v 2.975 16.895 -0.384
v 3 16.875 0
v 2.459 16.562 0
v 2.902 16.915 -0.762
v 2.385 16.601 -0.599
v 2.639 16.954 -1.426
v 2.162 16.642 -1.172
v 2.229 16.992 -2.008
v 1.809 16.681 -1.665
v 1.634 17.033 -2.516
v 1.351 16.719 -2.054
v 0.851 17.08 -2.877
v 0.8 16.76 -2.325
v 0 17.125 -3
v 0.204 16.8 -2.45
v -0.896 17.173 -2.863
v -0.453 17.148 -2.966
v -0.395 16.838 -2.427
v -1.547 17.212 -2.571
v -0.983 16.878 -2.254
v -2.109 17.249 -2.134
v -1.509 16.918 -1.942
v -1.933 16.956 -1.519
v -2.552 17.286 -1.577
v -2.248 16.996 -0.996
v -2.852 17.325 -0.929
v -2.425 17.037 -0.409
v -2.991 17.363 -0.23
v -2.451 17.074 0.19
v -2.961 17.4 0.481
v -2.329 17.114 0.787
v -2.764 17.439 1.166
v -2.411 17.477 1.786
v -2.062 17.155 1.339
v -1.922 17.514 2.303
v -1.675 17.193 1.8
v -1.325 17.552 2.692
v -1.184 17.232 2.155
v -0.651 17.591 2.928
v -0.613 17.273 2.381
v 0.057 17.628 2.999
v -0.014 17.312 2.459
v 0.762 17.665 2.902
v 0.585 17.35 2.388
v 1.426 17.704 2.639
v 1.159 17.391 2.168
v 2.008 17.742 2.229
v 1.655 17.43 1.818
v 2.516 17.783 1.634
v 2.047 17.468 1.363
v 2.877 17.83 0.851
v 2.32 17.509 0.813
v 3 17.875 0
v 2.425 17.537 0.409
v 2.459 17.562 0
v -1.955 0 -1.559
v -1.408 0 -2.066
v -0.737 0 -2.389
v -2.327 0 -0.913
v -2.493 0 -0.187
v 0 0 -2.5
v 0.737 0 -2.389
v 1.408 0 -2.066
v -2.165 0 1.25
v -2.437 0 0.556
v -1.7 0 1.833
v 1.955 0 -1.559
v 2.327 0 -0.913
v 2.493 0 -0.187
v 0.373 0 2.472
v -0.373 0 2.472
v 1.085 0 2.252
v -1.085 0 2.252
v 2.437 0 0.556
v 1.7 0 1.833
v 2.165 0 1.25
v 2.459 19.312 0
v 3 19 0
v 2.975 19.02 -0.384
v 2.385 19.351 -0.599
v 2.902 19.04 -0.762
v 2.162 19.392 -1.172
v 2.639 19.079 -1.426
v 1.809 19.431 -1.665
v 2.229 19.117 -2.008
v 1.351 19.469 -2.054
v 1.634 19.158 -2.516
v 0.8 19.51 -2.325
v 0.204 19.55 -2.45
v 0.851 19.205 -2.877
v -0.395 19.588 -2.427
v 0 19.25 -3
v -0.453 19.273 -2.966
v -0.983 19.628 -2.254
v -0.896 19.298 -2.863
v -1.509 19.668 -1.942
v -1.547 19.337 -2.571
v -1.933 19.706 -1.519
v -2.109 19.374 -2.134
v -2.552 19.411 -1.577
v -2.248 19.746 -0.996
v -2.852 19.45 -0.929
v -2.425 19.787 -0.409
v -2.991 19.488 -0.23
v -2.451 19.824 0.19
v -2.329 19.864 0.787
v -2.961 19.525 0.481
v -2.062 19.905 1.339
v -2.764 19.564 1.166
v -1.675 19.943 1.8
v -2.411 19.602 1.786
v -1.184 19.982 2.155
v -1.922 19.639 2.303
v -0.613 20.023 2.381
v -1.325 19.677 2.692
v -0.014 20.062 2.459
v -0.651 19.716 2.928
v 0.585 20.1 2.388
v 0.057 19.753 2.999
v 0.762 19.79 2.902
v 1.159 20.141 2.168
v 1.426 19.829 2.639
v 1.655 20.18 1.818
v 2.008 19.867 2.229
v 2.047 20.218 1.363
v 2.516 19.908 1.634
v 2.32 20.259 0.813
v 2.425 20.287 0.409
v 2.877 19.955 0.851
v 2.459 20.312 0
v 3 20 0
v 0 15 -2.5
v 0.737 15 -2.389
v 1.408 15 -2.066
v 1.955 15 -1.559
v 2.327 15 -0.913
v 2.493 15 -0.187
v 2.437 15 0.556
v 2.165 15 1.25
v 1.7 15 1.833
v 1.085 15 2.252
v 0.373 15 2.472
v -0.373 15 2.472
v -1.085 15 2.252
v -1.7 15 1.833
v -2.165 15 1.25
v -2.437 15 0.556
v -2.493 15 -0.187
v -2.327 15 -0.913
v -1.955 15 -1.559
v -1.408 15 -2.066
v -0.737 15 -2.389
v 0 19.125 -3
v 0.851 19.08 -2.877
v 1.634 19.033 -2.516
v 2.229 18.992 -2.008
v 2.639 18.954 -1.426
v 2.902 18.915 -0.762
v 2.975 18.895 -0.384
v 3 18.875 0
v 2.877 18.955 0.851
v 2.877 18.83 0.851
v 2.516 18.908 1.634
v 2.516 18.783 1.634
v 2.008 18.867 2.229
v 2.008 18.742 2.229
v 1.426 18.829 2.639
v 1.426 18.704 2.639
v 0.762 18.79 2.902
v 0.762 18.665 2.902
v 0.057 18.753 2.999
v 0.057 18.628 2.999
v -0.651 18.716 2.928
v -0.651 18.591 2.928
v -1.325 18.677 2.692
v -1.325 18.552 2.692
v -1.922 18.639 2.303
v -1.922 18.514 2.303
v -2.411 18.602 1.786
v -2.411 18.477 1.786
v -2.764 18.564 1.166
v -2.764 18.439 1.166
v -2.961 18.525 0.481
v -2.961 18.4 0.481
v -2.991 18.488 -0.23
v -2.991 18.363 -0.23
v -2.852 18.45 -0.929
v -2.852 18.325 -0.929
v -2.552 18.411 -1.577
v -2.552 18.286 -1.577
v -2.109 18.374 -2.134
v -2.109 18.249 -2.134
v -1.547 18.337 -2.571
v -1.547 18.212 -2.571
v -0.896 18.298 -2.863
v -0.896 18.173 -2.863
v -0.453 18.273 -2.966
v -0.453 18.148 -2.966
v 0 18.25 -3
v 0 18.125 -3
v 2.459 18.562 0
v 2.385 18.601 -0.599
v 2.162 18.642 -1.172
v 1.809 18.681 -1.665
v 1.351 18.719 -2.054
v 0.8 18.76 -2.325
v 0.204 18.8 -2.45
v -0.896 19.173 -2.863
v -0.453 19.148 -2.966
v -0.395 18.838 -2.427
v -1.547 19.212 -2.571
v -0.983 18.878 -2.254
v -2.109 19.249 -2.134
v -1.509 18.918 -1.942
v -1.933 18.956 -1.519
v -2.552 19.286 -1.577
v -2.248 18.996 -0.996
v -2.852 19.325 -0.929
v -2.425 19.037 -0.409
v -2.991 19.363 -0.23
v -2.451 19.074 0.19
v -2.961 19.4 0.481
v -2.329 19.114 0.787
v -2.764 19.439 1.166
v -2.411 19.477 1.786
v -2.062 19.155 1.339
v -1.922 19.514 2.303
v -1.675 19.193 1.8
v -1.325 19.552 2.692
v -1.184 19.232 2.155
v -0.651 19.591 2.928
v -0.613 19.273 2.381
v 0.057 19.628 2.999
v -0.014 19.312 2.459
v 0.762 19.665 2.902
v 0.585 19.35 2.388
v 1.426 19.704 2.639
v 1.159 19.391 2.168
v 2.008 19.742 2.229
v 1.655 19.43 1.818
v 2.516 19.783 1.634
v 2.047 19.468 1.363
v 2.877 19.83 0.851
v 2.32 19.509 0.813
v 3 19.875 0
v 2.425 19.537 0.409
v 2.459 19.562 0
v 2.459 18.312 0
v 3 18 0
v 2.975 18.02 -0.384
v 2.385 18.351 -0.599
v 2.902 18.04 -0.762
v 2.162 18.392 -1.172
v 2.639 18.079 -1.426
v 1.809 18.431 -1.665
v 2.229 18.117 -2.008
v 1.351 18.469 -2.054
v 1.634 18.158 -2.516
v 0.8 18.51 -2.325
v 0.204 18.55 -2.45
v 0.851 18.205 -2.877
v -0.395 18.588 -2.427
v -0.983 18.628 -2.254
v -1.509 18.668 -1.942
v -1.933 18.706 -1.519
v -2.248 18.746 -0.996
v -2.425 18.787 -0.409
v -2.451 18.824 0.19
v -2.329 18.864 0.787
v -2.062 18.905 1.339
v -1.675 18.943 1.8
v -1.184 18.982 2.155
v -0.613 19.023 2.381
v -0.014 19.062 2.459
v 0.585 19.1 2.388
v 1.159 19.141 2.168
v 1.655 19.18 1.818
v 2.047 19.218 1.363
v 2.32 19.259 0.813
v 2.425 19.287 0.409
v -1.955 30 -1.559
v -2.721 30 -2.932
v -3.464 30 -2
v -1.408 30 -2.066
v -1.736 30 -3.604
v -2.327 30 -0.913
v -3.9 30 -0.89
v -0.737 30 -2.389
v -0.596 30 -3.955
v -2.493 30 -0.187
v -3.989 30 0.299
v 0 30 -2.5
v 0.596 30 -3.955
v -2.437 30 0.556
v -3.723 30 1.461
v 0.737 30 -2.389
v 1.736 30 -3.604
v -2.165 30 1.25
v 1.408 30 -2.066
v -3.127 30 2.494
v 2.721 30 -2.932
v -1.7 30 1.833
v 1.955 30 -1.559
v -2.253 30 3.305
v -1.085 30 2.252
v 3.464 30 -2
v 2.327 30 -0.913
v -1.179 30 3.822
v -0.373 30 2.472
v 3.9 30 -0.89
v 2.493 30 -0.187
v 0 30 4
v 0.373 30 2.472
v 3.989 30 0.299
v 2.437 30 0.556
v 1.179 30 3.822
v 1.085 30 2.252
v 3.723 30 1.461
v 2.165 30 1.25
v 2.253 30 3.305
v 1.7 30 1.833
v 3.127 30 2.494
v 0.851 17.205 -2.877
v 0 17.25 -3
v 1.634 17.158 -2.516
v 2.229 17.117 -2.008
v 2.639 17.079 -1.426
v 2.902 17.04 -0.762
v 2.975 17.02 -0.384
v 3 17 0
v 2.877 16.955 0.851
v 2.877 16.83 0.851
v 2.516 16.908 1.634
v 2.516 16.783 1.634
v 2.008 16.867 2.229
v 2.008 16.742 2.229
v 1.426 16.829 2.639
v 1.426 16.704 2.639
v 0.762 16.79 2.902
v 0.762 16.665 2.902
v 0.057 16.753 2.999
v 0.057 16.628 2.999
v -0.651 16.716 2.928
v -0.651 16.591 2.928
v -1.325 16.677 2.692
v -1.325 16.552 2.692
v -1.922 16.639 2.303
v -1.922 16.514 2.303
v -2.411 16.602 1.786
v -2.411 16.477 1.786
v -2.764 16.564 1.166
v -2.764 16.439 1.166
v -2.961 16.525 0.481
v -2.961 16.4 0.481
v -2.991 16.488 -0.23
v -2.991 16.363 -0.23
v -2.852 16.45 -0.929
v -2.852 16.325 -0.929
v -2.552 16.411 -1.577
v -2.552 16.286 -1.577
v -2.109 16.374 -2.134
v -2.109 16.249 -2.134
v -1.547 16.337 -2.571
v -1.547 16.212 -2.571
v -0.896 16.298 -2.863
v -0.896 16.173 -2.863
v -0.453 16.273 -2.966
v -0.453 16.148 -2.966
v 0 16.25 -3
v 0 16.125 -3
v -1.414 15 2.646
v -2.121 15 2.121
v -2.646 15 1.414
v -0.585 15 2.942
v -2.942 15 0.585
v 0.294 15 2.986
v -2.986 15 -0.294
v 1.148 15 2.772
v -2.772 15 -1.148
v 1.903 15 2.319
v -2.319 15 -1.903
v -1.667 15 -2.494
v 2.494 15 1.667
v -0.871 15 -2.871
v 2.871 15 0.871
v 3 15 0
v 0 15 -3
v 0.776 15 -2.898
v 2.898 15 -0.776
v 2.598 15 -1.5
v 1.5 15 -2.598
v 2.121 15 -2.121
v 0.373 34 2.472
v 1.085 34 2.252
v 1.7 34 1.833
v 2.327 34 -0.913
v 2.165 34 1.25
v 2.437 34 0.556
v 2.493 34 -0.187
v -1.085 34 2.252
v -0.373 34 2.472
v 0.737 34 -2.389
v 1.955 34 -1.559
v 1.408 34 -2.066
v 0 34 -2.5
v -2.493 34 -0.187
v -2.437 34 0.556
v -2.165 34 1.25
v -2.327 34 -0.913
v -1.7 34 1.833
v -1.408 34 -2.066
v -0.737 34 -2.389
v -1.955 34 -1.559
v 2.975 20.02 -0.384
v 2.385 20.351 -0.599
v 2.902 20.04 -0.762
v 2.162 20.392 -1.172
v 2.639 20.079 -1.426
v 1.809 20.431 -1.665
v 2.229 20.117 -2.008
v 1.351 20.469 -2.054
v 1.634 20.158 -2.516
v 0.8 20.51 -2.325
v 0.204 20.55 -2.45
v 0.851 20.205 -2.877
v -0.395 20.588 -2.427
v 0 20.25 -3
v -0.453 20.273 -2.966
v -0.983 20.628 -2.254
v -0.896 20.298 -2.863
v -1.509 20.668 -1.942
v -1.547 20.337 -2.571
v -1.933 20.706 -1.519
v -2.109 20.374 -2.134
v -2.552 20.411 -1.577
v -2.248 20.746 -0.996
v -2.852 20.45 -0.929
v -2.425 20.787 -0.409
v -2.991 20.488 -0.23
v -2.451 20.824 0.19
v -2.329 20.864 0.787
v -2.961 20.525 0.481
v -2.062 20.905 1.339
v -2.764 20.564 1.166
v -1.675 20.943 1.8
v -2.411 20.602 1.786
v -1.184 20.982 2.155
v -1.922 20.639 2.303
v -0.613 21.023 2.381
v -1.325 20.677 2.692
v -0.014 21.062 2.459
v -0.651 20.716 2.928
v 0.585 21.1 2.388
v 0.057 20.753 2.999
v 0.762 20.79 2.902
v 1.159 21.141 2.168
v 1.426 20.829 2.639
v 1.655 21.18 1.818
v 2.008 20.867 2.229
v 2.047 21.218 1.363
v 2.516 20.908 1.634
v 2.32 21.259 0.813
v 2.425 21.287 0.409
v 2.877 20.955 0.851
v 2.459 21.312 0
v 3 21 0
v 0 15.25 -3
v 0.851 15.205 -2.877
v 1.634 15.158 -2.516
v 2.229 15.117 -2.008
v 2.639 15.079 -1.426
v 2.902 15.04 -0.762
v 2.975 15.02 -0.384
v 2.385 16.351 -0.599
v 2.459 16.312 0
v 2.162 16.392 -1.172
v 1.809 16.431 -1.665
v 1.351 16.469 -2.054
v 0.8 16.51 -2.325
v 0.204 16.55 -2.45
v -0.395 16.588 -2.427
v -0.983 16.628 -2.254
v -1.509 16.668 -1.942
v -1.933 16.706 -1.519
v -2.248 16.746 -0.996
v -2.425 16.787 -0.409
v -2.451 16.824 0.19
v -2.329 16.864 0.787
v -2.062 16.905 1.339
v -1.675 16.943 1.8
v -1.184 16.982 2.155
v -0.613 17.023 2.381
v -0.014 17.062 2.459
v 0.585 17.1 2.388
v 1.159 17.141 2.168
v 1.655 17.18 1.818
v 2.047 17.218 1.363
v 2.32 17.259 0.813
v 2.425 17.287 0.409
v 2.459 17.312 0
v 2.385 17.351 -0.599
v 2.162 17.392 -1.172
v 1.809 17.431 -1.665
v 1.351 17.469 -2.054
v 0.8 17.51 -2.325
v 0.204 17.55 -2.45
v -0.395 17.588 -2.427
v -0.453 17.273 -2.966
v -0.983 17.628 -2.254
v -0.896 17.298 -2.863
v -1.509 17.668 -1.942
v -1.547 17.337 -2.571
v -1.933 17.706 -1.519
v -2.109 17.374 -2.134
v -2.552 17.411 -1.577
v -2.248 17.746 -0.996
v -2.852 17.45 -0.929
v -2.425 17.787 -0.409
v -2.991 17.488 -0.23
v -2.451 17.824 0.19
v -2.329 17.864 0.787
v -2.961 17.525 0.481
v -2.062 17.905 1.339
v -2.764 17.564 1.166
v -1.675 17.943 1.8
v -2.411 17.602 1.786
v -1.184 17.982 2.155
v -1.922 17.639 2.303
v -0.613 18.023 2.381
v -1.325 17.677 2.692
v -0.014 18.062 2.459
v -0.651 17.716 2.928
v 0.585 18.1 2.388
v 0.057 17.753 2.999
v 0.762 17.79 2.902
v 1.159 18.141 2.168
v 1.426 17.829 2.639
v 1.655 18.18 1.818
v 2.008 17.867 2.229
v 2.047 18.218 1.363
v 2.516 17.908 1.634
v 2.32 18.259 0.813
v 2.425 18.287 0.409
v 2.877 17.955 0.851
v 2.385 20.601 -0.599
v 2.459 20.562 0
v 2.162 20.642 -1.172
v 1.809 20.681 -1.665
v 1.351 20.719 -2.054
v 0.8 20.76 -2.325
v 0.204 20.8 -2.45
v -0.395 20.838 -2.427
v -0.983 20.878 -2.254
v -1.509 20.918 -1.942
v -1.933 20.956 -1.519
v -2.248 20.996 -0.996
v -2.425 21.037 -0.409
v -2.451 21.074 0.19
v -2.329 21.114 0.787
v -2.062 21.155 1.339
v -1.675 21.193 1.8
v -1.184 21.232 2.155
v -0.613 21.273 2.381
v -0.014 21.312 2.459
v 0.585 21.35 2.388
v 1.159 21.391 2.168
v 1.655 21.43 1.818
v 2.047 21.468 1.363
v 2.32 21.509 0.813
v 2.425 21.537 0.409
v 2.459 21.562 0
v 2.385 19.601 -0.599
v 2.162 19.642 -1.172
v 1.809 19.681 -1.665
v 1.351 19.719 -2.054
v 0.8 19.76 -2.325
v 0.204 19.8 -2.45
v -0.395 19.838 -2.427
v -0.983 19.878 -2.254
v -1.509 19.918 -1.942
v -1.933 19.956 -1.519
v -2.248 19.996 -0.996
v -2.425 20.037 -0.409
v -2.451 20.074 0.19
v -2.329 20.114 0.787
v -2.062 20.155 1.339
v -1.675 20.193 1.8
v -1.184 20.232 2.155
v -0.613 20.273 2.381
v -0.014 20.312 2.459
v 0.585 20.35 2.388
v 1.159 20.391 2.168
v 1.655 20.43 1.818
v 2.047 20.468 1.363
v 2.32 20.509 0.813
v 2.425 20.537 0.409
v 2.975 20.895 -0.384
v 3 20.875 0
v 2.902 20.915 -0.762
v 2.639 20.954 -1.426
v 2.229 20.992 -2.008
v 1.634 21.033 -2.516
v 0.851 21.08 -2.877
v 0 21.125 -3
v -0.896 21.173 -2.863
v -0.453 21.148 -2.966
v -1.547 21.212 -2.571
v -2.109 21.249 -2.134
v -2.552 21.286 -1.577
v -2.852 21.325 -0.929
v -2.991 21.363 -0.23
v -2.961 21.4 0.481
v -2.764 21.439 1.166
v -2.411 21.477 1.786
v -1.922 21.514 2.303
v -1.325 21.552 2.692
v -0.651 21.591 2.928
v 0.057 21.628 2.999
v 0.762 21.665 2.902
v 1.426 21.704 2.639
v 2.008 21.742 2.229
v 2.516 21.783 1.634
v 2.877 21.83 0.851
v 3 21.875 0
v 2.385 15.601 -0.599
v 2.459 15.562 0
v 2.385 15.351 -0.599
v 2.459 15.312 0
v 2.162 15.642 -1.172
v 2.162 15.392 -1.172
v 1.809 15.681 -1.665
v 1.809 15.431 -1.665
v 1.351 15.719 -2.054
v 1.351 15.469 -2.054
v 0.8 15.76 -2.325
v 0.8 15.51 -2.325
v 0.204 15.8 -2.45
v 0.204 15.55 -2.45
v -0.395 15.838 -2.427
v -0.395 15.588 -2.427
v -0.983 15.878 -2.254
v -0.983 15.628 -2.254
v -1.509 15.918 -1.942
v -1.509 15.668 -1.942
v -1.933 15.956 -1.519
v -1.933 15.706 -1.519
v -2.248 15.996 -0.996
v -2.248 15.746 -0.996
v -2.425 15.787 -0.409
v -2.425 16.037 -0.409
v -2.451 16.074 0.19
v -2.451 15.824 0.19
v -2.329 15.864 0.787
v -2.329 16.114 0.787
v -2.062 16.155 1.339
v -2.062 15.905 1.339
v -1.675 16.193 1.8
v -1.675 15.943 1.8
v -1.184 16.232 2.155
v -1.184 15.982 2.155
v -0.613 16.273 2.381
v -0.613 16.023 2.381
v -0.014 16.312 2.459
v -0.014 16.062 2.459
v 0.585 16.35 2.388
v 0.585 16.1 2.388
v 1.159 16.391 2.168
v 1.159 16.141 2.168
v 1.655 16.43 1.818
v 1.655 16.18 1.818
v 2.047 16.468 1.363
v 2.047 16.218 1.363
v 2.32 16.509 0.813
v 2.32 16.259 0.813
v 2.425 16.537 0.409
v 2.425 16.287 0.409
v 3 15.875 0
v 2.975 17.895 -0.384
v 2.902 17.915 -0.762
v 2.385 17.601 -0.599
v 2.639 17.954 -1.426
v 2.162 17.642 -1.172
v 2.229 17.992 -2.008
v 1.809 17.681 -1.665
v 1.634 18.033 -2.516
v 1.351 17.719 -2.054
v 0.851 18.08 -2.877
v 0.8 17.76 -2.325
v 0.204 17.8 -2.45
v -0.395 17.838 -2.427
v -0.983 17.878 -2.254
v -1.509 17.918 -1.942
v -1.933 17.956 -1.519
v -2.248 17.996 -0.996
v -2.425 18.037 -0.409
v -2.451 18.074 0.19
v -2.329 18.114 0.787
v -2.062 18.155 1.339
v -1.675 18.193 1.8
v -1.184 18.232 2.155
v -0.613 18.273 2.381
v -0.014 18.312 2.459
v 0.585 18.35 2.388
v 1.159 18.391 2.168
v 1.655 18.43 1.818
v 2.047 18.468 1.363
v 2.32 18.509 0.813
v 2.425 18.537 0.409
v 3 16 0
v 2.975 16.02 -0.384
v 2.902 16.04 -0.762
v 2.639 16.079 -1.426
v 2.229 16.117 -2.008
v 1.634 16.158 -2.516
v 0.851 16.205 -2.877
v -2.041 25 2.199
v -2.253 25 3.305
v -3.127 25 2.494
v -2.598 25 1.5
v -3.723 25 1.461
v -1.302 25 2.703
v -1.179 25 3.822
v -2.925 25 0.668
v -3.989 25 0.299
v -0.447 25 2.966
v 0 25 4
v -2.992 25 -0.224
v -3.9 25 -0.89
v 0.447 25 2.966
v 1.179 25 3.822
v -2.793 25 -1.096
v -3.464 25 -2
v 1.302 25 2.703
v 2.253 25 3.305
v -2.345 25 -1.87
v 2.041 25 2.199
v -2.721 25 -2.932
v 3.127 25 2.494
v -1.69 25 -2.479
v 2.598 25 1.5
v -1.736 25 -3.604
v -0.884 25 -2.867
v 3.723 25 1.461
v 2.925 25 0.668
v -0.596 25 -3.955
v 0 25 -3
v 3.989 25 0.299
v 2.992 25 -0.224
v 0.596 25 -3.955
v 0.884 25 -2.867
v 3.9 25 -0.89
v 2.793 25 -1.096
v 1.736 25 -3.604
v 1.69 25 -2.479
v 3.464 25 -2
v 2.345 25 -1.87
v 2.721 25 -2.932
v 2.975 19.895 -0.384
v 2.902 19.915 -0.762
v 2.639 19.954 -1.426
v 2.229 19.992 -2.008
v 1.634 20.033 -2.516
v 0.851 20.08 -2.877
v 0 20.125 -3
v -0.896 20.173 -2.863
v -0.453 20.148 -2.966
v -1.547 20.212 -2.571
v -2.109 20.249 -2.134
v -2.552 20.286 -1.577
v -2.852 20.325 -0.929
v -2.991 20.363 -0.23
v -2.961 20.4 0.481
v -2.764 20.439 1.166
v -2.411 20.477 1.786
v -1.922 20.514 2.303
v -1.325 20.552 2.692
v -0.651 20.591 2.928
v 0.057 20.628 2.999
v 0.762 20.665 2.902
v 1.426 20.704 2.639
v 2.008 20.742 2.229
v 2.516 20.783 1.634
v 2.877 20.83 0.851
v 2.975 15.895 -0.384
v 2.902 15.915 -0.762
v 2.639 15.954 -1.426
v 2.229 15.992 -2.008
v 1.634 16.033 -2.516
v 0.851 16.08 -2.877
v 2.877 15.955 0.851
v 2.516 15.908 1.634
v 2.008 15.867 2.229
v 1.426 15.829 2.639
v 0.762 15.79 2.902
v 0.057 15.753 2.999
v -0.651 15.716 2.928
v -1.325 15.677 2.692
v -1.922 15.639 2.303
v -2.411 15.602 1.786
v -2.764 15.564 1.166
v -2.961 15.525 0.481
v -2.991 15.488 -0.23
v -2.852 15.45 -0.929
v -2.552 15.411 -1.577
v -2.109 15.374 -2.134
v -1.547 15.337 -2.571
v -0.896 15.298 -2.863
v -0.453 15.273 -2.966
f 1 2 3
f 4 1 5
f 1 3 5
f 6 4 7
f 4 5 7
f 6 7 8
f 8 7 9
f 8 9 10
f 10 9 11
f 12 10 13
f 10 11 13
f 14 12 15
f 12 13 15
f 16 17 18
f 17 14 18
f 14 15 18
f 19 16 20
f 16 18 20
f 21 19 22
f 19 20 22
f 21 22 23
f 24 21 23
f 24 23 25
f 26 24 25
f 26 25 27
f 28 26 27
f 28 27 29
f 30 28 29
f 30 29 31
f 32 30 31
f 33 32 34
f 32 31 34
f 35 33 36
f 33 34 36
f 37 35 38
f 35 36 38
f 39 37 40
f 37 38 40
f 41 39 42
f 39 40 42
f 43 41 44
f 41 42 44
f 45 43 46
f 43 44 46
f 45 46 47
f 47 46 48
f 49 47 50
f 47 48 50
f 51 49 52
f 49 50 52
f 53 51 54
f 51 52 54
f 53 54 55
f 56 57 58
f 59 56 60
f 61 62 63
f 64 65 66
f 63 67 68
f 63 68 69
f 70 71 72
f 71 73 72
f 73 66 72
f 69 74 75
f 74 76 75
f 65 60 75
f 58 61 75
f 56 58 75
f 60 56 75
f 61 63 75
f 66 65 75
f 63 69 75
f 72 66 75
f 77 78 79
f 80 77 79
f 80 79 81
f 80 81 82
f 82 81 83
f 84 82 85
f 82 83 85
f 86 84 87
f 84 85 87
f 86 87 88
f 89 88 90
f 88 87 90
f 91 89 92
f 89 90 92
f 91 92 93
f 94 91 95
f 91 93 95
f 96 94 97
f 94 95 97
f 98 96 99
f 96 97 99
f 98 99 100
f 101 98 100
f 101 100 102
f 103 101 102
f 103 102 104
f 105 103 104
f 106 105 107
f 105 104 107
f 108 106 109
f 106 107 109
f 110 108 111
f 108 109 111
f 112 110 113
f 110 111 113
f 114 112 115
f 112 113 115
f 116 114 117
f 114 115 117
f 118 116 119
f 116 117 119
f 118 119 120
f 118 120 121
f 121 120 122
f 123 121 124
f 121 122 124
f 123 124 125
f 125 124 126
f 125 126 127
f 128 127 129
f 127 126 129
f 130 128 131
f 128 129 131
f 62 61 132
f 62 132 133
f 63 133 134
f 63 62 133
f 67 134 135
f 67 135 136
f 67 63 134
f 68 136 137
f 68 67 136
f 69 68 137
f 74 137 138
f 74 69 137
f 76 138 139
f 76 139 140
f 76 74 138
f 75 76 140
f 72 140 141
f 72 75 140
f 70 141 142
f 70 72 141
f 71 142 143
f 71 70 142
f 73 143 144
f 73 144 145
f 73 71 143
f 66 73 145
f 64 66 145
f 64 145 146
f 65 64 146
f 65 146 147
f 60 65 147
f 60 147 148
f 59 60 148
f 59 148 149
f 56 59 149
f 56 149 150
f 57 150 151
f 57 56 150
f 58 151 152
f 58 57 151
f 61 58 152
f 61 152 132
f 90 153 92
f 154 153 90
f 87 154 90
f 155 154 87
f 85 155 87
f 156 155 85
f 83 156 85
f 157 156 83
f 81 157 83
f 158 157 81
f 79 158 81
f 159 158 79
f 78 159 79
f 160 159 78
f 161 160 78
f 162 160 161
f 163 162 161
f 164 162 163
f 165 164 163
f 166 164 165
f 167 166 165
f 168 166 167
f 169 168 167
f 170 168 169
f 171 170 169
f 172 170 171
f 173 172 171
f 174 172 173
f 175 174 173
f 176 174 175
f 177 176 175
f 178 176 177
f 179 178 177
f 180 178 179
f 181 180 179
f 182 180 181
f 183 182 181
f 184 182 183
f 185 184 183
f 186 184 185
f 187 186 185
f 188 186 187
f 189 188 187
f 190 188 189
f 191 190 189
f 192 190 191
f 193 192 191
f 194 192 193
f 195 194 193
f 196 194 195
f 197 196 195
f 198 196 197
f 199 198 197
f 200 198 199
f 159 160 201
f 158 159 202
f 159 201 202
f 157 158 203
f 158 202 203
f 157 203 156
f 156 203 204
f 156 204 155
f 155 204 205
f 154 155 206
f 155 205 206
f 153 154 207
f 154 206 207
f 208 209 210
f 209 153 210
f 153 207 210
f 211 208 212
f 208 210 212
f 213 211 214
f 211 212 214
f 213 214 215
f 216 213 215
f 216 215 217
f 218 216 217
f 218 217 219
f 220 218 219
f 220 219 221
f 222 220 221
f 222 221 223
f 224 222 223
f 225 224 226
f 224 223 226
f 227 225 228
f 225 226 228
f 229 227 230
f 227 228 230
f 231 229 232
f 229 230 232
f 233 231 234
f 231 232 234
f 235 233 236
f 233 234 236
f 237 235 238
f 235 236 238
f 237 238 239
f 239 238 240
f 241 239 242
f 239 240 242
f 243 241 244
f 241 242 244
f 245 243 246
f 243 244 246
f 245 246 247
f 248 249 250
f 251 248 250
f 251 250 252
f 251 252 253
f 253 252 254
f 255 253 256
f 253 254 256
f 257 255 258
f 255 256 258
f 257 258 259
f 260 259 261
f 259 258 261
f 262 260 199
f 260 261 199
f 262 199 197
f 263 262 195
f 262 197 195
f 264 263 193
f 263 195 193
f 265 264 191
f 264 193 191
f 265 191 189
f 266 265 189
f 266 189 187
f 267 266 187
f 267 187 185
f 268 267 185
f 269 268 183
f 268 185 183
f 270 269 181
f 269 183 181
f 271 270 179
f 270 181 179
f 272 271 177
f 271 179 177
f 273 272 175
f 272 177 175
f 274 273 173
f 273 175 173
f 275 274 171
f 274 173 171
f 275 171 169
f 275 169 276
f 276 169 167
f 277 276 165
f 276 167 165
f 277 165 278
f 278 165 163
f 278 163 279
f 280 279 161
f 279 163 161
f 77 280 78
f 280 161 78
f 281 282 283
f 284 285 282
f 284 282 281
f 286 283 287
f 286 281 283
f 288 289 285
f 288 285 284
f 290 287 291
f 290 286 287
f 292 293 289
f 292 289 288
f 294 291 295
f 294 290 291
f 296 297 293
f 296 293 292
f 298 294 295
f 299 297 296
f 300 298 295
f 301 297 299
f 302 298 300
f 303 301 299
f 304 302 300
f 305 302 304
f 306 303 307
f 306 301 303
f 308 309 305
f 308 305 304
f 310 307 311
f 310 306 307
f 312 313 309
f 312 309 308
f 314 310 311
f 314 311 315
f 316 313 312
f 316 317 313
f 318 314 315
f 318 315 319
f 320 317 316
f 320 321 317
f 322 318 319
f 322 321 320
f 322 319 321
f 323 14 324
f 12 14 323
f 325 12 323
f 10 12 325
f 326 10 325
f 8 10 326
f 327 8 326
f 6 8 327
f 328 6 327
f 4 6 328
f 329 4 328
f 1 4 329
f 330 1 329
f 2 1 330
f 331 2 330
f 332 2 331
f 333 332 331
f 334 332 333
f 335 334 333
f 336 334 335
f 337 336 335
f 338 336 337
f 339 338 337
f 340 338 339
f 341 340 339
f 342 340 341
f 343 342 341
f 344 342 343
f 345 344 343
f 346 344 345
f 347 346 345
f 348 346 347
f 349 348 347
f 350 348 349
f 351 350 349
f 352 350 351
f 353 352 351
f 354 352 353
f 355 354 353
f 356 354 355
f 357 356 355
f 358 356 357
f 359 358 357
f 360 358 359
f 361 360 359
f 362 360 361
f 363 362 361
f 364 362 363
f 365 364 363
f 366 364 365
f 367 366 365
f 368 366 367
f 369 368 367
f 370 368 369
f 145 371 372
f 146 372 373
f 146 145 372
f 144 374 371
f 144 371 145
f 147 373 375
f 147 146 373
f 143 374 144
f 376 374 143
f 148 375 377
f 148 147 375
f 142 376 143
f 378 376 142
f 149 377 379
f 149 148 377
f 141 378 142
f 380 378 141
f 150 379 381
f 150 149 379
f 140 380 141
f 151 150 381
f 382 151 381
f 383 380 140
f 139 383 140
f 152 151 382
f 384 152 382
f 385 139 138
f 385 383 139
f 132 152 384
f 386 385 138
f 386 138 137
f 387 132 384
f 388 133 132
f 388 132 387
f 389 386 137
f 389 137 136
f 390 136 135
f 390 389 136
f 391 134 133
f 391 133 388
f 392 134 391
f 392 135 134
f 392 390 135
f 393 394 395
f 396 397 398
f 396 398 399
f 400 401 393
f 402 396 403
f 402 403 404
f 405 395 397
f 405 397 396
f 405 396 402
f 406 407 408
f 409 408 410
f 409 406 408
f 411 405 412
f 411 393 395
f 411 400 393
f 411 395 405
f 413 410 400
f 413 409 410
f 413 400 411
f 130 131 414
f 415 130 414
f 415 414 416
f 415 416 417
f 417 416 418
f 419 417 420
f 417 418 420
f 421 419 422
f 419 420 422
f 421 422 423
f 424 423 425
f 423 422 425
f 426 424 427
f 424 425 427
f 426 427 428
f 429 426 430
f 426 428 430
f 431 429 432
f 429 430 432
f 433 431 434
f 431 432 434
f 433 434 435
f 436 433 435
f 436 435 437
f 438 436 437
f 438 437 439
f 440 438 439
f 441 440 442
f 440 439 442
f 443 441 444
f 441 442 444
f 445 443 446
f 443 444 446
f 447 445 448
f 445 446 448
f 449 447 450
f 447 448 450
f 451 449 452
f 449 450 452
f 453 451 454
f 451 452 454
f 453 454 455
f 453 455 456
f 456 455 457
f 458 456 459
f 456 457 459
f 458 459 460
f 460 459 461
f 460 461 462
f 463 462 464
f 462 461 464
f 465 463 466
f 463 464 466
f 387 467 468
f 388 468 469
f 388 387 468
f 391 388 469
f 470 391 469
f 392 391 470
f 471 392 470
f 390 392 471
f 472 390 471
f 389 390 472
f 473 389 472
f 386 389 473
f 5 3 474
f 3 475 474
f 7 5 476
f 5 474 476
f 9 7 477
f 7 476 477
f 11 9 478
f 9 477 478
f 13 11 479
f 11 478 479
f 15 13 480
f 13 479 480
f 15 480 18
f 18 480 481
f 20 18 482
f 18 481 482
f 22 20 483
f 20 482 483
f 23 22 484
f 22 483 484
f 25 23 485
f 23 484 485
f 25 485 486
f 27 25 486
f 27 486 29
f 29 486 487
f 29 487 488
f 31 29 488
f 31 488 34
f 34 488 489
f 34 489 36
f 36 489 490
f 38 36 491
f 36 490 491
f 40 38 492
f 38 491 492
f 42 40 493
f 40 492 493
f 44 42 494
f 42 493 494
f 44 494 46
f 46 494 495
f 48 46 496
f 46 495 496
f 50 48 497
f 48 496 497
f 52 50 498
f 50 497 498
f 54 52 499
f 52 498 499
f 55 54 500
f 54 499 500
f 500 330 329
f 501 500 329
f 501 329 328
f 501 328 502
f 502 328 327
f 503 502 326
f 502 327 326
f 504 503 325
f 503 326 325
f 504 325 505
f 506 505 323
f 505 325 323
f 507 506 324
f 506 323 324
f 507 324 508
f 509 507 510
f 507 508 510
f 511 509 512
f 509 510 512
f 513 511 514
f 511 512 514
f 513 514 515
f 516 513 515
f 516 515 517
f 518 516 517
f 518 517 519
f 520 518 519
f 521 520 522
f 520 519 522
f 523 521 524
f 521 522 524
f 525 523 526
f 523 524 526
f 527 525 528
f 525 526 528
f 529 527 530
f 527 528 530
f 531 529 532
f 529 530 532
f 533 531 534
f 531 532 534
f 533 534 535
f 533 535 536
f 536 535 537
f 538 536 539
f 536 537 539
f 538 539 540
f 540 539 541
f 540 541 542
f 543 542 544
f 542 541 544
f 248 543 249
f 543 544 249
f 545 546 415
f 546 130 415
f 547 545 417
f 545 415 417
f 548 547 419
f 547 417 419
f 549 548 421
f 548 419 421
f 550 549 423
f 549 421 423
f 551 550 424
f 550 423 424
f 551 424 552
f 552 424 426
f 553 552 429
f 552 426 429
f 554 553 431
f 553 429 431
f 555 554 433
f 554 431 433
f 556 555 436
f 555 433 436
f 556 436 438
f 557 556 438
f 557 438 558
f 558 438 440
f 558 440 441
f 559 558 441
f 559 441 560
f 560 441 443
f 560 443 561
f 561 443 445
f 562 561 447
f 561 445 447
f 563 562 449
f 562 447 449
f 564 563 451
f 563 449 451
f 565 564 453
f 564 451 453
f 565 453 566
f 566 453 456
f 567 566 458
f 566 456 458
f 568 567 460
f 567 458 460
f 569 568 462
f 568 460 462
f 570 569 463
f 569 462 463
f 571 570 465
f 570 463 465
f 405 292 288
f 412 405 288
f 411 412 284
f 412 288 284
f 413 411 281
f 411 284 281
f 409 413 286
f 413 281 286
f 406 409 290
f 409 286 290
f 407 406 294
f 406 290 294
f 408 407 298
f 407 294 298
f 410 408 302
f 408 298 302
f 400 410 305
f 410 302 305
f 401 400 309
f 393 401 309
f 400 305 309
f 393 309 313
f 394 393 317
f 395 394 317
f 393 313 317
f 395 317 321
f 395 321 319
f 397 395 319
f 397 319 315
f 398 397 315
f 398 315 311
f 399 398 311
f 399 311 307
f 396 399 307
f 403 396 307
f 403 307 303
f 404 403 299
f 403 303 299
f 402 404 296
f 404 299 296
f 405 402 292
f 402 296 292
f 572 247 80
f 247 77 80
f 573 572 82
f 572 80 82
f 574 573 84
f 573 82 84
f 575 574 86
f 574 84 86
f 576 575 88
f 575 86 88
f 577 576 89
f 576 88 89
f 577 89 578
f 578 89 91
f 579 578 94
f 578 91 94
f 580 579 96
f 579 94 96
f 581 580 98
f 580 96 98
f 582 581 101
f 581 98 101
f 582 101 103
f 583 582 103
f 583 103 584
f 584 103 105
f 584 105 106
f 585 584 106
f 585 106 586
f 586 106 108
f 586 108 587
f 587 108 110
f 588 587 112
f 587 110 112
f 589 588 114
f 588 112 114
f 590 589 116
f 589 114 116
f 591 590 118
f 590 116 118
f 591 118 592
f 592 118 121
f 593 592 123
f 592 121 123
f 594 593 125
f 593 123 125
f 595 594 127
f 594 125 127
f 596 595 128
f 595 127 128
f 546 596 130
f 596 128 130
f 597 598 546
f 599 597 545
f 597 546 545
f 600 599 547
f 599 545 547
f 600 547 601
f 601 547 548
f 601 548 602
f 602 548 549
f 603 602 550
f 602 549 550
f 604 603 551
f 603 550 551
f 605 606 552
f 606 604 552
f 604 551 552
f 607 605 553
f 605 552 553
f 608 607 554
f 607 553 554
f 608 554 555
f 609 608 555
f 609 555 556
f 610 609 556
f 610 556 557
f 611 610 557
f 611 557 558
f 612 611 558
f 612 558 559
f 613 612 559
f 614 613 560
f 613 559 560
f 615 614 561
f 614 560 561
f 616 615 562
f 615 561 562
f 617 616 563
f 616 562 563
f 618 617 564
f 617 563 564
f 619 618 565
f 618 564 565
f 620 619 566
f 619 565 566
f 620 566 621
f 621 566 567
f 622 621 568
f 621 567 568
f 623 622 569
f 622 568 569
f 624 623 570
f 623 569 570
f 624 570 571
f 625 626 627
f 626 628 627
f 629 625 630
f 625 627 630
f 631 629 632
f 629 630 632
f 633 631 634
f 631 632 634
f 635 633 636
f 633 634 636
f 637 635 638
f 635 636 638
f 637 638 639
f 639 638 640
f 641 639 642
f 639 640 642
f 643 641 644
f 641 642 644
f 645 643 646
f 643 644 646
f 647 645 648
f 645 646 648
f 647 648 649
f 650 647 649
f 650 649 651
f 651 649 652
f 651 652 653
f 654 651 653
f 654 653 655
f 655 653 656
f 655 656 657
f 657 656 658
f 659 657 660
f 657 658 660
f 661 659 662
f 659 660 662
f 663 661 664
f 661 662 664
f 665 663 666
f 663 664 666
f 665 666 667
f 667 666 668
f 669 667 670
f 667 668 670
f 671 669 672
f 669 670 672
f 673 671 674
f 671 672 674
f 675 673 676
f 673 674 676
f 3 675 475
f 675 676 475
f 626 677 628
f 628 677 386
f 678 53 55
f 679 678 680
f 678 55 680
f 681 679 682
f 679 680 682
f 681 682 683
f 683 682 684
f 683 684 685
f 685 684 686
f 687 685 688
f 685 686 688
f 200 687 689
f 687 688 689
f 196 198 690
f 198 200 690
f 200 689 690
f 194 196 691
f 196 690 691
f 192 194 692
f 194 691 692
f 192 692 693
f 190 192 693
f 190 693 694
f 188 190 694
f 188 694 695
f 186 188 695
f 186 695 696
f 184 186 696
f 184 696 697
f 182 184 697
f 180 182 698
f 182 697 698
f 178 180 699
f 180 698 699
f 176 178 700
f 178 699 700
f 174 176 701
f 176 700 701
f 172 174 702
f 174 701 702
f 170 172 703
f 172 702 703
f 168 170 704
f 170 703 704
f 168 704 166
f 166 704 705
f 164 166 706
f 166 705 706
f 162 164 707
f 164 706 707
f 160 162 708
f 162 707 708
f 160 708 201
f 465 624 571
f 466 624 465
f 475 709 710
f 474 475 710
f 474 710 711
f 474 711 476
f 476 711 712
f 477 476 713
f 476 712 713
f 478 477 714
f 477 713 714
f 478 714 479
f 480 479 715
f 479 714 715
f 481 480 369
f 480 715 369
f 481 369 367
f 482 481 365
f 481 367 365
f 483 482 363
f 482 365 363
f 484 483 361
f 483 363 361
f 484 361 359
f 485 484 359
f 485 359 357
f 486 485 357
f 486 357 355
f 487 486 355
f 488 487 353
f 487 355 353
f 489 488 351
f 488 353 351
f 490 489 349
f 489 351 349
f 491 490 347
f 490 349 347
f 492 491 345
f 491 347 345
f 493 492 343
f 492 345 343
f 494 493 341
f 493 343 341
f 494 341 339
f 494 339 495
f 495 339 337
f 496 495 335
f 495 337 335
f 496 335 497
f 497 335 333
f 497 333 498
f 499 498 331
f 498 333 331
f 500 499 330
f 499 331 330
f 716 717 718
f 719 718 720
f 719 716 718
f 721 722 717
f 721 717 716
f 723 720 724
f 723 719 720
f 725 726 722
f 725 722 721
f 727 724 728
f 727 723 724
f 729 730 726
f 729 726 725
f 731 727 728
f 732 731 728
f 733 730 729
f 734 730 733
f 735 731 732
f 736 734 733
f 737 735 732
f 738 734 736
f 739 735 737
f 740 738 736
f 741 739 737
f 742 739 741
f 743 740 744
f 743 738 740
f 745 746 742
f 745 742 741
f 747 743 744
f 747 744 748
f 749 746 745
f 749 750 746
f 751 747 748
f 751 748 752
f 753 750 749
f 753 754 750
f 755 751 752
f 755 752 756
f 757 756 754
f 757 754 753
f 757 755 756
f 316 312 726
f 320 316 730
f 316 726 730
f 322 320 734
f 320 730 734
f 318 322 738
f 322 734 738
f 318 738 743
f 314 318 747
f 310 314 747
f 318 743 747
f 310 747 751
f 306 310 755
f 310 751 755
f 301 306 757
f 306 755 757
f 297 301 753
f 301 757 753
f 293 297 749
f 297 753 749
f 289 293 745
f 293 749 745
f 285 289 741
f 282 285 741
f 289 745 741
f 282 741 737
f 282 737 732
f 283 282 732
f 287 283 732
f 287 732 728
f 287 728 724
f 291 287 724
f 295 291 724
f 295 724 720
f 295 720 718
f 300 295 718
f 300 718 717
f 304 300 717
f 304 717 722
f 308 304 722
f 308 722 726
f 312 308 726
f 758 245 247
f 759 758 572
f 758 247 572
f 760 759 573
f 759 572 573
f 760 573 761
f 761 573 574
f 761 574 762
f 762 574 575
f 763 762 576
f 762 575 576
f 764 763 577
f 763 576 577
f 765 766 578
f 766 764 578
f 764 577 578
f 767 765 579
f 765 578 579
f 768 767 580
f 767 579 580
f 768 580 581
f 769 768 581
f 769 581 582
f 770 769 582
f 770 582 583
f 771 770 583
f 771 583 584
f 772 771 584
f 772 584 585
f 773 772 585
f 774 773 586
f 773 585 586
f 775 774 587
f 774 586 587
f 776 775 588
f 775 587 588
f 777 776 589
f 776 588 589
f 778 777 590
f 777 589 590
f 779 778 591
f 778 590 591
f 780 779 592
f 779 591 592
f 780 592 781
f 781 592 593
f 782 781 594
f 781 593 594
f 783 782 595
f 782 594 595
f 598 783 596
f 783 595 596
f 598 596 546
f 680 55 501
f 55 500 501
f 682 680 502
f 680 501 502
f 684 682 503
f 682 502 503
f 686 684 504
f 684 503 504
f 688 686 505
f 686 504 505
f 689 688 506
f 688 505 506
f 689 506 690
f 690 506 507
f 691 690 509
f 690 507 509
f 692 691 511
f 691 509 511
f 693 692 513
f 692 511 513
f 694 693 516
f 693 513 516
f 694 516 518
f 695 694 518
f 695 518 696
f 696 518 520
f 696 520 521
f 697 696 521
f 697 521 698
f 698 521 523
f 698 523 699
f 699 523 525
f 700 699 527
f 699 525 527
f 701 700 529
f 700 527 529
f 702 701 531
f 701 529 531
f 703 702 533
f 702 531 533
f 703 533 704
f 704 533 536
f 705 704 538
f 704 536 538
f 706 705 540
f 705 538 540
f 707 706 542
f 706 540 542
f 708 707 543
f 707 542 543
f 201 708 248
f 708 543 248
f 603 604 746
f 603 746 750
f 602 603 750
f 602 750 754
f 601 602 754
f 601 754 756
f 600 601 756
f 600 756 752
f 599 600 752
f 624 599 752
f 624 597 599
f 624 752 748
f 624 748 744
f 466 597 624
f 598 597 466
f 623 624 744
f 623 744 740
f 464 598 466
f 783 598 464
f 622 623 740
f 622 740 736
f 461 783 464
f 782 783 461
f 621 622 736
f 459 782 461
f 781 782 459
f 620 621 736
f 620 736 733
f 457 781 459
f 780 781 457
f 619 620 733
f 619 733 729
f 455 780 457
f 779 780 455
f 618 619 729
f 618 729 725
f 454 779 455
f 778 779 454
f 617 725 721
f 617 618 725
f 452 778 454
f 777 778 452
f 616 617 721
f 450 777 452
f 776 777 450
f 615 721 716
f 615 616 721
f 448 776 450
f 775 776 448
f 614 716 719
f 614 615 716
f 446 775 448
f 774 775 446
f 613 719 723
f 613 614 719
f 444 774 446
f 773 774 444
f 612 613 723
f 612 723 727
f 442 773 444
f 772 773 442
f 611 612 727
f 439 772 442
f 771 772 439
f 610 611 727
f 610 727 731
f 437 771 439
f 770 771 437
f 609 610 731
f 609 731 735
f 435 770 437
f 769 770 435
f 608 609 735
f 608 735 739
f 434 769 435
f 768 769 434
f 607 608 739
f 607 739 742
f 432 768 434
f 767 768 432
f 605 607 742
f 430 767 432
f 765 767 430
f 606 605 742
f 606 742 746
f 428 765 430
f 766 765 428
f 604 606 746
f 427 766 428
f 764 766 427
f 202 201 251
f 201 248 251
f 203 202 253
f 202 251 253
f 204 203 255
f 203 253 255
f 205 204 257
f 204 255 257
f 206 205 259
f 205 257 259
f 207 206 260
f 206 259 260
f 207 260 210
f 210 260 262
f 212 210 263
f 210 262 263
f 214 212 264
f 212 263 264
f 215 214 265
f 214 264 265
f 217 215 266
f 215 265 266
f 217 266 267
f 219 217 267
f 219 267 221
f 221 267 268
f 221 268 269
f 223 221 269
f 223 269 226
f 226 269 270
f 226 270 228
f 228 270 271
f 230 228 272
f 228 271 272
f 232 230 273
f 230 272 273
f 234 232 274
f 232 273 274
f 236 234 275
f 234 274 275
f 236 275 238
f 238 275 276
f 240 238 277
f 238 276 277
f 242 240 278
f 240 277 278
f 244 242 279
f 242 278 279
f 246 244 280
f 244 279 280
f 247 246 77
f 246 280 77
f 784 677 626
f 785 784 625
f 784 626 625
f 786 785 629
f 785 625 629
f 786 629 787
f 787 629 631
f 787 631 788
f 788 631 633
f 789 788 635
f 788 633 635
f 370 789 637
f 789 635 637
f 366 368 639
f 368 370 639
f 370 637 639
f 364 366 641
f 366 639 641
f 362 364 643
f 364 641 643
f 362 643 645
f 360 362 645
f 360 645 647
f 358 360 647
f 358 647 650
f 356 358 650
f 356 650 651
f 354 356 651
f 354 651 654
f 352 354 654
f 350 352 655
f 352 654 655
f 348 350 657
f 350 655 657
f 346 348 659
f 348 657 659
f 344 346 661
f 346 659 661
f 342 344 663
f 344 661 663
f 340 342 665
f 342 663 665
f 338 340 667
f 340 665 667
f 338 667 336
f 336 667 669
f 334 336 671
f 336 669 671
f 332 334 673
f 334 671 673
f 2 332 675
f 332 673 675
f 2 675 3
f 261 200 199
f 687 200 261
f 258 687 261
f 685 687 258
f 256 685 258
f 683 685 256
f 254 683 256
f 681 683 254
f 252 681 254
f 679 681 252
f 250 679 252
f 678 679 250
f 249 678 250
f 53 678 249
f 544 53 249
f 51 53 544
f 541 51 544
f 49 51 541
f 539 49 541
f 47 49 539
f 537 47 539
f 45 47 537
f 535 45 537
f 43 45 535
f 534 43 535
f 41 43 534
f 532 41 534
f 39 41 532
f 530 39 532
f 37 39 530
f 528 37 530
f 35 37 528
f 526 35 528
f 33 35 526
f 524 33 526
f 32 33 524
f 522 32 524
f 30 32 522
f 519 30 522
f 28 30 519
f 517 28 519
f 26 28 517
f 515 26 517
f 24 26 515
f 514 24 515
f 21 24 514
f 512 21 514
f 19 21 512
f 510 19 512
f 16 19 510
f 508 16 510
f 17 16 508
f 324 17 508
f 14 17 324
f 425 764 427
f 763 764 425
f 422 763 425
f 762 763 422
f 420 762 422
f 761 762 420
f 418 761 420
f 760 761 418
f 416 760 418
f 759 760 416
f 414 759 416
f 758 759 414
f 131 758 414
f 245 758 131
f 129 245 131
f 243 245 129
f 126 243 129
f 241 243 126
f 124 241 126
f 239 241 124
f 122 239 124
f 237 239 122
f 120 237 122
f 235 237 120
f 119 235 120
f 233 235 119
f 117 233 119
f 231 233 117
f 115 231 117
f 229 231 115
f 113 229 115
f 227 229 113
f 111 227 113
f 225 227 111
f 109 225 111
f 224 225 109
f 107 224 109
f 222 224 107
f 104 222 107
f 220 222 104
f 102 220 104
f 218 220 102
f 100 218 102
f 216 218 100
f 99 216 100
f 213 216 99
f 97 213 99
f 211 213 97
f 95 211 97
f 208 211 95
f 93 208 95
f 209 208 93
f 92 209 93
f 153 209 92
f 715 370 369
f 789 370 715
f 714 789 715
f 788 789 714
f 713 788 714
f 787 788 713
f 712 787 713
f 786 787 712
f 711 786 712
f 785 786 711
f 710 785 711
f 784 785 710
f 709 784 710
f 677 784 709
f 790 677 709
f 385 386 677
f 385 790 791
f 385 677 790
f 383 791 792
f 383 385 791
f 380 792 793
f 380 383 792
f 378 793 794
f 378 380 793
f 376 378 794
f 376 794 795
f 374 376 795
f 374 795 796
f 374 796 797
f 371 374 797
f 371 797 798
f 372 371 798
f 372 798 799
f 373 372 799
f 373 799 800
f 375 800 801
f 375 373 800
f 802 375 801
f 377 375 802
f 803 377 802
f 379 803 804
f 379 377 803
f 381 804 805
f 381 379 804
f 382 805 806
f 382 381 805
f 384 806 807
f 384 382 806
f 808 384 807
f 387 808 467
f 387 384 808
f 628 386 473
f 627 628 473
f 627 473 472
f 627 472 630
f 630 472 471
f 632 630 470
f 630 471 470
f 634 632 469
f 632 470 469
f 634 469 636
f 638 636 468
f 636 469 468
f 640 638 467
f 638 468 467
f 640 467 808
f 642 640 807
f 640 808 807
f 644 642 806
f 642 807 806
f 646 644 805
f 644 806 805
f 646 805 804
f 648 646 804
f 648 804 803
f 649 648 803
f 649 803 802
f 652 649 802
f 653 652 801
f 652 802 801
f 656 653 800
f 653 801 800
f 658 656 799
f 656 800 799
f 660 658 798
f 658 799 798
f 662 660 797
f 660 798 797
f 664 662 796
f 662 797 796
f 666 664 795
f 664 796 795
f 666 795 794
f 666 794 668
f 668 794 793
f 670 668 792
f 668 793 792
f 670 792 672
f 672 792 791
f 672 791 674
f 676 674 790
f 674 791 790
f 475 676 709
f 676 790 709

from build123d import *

# Parameters (mm, degrees)
SKETCH1_R           = 4
BOSS_EXTRUDE1_DEPTH = 30
SKETCH8_R           = 4
SKETCH8_R_2         = 3
CUT_EXTRUDE2_DEPTH  = 25
SKETCH15_R          = 3
SKETCH15_R_2        = 2.5
CUT_EXTRUDE3_DEPTH  = 15
THREAD1_PITCH       = 1
SKETCH18_R          = 2.5
BOSS_EXTRUDE2_DEPTH = 4


with BuildPart() as part:
    # Sketch1 → Boss-Extrude1 (new body)
    with BuildSketch(Plane(origin=(0, 0, 0), x_dir=(1, 0, 0), z_dir=(0, 1, 0))):
        with Locations(Location((0, 0, 0), (0, 0, 270))):
            Circle(SKETCH1_R)
    extrude(amount=BOSS_EXTRUDE1_DEPTH)

    # Sketch8 → Cut-Extrude2 (cut)
    with BuildSketch(Plane.XZ):
        with Locations(Location((0, 0, 0), (0, 0, 270))):
            Circle(SKETCH8_R)
        with Locations(Location((0, 0, 0), (0, 0, 270))):
            Circle(SKETCH8_R_2, mode=Mode.SUBTRACT)
    extrude(amount=-CUT_EXTRUDE2_DEPTH, mode=Mode.SUBTRACT)

    # Sketch15 → Cut-Extrude3 (cut)
    with BuildSketch(Plane.XZ):
        with Locations(Location((0, 0, 0), (0, 0, 270))):
            Circle(SKETCH15_R)
        with Locations(Location((0, 0, 0), (0, 0, 270))):
            Circle(SKETCH15_R_2, mode=Mode.SUBTRACT)
    extrude(amount=-CUT_EXTRUDE3_DEPTH, mode=Mode.SUBTRACT)

    # Thread1: the profile of Thread Profile1 profile screwed along a right-hand helix of 6 turns, 8 arcs to a turn; built about Z, then put on its axis
    thread1_z = Axis((0, 0, 0), (0, 0, 1))
    thread1_corners = [(3.0003, 0, -0.000173205), (3.0003, 0, 0.875173202), (2.458734125, 0, 0.562499999), (2.458734125, 0, 0.312499999)]
    with BuildLine(mode=Mode.PRIVATE) as thread1_profile:
        Line(thread1_corners[0], thread1_corners[1])
        Line(thread1_corners[1], thread1_corners[2])
        Line(thread1_corners[2], thread1_corners[3])
        Line(thread1_corners[3], thread1_corners[0])
    thread1_cap = Face(thread1_profile.wire())
    thread1_turn_angles = [0, 22.5, 45, 67.5, 90, 112.5, 135, 157.5, 180, 202.5, 225, 247.5, 270, 292.5, 315, 337.5, 360]
    thread1_turn_weights = [1, 0.9238795325112867, 1, 0.9238795325112867, 1, 0.9238795325112867, 1, 0.9238795325112867, 1, 0.9238795325112867, 1, 0.9238795325112867, 1, 0.9238795325112867, 1, 0.9238795325112867, 1]
    thread1_turn_rails = [Edge.make_bspline([Vector(p[0], p[1], 0).rotate(thread1_z, thread1_turn_angles[k]) / thread1_turn_weights[k] + Vector(0, 0, p[2] + THREAD1_PITCH * thread1_turn_angles[k] / 360) for k in range(17)], [0, 0, 0, 1, 1, 2, 2, 3, 3, 4, 4, 5, 5, 6, 6, 7, 7, 8, 8, 8], 2, thread1_turn_weights) for p in thread1_corners]
    thread1_turn_sides = [Face.make_surface_from_curves(thread1_turn_rails[p[0]], thread1_turn_rails[p[1]]) for p in [(0, 1), (1, 2), (2, 3), (3, 0)]]
    thread1_turn = Solid(Shell([*thread1_turn_sides, thread1_cap, thread1_cap.rotate(thread1_z, 360).moved(Location((0, 0, THREAD1_PITCH * 360 / 360)))]))
    thread1_each = [*[thread1_turn.moved(Location((0, 0, THREAD1_PITCH * i))) for i in range(6)]]
    add(Plane(origin=(0, 15, 0), x_dir=(1, 0, 0), z_dir=(0, 1, 0)) * Compound([thread1_each[i] for i in range(0, 6, 2)]), mode=Mode.SUBTRACT)
    add(Plane(origin=(0, 15, 0), x_dir=(1, 0, 0), z_dir=(0, 1, 0)) * Compound([thread1_each[i] for i in range(1, 6, 2)]), mode=Mode.SUBTRACT)

    # Sketch18 → Boss-Extrude2 (add)
    with BuildSketch(Plane(origin=(0, 30, 0), x_dir=(1, 0, 0), z_dir=(0, 1, 0))):
        with Locations(Location((0, 0, 0), (0, 0, 90))):
            Circle(SKETCH18_R)
    extrude(amount=BOSS_EXTRUDE2_DEPTH)


solid = part.part
